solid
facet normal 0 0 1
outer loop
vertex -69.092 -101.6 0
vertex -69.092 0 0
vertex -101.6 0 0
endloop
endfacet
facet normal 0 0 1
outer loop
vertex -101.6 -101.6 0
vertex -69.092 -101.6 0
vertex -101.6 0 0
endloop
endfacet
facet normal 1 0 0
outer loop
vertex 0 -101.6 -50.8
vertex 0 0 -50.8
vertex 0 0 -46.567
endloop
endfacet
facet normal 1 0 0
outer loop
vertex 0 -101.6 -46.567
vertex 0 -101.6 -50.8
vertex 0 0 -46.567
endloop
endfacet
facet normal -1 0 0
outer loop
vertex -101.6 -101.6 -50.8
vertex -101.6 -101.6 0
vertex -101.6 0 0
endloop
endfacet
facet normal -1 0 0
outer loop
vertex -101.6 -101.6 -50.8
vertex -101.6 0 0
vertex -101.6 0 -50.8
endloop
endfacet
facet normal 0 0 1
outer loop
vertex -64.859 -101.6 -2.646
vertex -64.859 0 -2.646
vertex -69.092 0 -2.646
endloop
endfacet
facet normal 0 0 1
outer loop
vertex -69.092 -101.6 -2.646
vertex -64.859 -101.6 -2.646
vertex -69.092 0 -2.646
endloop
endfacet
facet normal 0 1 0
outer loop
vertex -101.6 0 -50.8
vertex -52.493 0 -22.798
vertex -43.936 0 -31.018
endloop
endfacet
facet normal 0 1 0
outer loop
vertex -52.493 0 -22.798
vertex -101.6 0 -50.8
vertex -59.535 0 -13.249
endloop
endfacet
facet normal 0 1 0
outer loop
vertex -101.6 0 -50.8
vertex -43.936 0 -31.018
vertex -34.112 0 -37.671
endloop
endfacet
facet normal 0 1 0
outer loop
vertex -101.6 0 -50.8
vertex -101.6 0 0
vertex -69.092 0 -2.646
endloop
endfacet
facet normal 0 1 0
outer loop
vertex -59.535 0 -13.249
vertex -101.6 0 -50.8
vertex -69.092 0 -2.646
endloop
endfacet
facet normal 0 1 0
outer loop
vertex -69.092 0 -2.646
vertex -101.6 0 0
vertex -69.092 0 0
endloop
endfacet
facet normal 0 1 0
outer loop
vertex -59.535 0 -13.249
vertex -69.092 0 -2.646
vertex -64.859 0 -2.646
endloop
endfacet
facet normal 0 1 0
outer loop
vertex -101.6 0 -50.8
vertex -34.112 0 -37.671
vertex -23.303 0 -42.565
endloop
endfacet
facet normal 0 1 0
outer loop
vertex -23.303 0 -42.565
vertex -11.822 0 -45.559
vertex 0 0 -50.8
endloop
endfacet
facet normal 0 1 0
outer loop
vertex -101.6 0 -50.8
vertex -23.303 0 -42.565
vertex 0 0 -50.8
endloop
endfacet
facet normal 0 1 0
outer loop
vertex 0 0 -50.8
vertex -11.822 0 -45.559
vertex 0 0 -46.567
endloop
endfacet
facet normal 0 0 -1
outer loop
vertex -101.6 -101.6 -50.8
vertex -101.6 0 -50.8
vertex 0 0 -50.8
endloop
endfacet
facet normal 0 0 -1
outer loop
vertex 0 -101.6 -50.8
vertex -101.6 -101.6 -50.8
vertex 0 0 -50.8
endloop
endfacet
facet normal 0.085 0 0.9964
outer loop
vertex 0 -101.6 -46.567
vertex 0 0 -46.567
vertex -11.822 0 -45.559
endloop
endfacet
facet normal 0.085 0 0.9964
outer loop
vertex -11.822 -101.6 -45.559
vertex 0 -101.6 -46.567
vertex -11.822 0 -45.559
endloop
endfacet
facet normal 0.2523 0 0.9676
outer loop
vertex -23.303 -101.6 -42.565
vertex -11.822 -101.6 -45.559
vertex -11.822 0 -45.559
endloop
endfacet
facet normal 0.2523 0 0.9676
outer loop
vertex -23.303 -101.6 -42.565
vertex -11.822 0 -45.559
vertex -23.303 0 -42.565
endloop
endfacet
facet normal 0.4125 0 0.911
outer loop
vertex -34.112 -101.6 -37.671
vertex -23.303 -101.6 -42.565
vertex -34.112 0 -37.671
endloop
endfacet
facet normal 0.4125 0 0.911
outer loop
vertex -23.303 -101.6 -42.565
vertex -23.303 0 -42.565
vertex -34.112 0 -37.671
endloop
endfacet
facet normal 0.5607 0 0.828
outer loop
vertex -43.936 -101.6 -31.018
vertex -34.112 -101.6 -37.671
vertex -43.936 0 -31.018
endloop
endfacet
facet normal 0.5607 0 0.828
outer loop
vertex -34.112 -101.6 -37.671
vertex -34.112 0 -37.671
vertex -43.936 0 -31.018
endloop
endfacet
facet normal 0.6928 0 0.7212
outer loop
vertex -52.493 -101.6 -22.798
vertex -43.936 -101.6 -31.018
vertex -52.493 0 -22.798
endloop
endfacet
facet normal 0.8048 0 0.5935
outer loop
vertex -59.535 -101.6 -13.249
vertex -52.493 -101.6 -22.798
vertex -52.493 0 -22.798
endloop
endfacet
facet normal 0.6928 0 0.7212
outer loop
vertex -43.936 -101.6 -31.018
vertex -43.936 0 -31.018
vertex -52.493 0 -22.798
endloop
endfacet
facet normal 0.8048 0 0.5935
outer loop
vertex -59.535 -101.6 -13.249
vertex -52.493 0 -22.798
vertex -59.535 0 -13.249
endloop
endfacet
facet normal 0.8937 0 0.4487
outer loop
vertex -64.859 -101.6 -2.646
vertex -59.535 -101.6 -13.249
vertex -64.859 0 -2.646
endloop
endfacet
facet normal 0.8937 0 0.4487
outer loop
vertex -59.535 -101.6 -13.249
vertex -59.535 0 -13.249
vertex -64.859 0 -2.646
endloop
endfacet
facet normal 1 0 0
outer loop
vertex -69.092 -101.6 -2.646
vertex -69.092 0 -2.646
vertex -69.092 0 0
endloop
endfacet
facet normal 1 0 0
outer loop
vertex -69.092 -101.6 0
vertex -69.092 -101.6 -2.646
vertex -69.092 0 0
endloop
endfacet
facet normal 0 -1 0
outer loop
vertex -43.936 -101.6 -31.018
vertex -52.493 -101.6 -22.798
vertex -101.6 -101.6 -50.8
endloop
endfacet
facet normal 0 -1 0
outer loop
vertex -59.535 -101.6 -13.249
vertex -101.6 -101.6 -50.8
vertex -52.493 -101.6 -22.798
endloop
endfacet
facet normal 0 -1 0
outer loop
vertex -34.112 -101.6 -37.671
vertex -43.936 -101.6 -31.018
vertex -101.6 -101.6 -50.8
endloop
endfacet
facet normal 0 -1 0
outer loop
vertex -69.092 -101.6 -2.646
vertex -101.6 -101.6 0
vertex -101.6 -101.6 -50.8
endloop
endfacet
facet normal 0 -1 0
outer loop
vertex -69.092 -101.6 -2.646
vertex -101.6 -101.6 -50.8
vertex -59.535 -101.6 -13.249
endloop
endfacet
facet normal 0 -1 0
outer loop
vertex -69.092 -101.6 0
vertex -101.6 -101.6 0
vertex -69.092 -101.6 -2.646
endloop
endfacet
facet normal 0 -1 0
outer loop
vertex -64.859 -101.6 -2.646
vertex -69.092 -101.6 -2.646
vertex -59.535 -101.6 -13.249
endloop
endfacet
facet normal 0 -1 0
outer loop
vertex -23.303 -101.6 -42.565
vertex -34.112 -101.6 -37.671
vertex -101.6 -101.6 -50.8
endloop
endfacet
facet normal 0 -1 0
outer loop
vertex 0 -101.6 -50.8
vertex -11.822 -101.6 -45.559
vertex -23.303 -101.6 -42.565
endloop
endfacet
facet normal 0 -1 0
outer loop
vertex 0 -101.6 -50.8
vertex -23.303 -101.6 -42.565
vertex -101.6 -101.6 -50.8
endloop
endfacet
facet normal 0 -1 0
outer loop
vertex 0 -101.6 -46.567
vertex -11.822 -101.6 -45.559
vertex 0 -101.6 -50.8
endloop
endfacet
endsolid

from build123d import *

# Parameters (mm, degrees)
F1_DEPTH = 101.6


with BuildPart() as f1:
    # F0 (on Front) → F1 (new body)
    with BuildSketch(Plane.XZ):
        with BuildLine():
            Line((0, -50.8), (0, -46.5666666667))
            ThreePointArc((0, -46.5666666667), (-39.1654835814, -34.5533971745), (-64.859084298, -2.6458333333))
            Line((-64.859084298, -2.6458333333), (-69.0924176313, -2.6458333333))
            Line((-69.0924176313, -2.6458333333), (-69.0924176313, 0))
            Line((-69.0924176313, 0), (-101.6, 0))
            Line((-101.6, 0), (-101.6, -50.8))
            Line((-101.6, -50.8), (0, -50.8))
        make_face()
    extrude(amount=F1_DEPTH)


solid = f1.part
